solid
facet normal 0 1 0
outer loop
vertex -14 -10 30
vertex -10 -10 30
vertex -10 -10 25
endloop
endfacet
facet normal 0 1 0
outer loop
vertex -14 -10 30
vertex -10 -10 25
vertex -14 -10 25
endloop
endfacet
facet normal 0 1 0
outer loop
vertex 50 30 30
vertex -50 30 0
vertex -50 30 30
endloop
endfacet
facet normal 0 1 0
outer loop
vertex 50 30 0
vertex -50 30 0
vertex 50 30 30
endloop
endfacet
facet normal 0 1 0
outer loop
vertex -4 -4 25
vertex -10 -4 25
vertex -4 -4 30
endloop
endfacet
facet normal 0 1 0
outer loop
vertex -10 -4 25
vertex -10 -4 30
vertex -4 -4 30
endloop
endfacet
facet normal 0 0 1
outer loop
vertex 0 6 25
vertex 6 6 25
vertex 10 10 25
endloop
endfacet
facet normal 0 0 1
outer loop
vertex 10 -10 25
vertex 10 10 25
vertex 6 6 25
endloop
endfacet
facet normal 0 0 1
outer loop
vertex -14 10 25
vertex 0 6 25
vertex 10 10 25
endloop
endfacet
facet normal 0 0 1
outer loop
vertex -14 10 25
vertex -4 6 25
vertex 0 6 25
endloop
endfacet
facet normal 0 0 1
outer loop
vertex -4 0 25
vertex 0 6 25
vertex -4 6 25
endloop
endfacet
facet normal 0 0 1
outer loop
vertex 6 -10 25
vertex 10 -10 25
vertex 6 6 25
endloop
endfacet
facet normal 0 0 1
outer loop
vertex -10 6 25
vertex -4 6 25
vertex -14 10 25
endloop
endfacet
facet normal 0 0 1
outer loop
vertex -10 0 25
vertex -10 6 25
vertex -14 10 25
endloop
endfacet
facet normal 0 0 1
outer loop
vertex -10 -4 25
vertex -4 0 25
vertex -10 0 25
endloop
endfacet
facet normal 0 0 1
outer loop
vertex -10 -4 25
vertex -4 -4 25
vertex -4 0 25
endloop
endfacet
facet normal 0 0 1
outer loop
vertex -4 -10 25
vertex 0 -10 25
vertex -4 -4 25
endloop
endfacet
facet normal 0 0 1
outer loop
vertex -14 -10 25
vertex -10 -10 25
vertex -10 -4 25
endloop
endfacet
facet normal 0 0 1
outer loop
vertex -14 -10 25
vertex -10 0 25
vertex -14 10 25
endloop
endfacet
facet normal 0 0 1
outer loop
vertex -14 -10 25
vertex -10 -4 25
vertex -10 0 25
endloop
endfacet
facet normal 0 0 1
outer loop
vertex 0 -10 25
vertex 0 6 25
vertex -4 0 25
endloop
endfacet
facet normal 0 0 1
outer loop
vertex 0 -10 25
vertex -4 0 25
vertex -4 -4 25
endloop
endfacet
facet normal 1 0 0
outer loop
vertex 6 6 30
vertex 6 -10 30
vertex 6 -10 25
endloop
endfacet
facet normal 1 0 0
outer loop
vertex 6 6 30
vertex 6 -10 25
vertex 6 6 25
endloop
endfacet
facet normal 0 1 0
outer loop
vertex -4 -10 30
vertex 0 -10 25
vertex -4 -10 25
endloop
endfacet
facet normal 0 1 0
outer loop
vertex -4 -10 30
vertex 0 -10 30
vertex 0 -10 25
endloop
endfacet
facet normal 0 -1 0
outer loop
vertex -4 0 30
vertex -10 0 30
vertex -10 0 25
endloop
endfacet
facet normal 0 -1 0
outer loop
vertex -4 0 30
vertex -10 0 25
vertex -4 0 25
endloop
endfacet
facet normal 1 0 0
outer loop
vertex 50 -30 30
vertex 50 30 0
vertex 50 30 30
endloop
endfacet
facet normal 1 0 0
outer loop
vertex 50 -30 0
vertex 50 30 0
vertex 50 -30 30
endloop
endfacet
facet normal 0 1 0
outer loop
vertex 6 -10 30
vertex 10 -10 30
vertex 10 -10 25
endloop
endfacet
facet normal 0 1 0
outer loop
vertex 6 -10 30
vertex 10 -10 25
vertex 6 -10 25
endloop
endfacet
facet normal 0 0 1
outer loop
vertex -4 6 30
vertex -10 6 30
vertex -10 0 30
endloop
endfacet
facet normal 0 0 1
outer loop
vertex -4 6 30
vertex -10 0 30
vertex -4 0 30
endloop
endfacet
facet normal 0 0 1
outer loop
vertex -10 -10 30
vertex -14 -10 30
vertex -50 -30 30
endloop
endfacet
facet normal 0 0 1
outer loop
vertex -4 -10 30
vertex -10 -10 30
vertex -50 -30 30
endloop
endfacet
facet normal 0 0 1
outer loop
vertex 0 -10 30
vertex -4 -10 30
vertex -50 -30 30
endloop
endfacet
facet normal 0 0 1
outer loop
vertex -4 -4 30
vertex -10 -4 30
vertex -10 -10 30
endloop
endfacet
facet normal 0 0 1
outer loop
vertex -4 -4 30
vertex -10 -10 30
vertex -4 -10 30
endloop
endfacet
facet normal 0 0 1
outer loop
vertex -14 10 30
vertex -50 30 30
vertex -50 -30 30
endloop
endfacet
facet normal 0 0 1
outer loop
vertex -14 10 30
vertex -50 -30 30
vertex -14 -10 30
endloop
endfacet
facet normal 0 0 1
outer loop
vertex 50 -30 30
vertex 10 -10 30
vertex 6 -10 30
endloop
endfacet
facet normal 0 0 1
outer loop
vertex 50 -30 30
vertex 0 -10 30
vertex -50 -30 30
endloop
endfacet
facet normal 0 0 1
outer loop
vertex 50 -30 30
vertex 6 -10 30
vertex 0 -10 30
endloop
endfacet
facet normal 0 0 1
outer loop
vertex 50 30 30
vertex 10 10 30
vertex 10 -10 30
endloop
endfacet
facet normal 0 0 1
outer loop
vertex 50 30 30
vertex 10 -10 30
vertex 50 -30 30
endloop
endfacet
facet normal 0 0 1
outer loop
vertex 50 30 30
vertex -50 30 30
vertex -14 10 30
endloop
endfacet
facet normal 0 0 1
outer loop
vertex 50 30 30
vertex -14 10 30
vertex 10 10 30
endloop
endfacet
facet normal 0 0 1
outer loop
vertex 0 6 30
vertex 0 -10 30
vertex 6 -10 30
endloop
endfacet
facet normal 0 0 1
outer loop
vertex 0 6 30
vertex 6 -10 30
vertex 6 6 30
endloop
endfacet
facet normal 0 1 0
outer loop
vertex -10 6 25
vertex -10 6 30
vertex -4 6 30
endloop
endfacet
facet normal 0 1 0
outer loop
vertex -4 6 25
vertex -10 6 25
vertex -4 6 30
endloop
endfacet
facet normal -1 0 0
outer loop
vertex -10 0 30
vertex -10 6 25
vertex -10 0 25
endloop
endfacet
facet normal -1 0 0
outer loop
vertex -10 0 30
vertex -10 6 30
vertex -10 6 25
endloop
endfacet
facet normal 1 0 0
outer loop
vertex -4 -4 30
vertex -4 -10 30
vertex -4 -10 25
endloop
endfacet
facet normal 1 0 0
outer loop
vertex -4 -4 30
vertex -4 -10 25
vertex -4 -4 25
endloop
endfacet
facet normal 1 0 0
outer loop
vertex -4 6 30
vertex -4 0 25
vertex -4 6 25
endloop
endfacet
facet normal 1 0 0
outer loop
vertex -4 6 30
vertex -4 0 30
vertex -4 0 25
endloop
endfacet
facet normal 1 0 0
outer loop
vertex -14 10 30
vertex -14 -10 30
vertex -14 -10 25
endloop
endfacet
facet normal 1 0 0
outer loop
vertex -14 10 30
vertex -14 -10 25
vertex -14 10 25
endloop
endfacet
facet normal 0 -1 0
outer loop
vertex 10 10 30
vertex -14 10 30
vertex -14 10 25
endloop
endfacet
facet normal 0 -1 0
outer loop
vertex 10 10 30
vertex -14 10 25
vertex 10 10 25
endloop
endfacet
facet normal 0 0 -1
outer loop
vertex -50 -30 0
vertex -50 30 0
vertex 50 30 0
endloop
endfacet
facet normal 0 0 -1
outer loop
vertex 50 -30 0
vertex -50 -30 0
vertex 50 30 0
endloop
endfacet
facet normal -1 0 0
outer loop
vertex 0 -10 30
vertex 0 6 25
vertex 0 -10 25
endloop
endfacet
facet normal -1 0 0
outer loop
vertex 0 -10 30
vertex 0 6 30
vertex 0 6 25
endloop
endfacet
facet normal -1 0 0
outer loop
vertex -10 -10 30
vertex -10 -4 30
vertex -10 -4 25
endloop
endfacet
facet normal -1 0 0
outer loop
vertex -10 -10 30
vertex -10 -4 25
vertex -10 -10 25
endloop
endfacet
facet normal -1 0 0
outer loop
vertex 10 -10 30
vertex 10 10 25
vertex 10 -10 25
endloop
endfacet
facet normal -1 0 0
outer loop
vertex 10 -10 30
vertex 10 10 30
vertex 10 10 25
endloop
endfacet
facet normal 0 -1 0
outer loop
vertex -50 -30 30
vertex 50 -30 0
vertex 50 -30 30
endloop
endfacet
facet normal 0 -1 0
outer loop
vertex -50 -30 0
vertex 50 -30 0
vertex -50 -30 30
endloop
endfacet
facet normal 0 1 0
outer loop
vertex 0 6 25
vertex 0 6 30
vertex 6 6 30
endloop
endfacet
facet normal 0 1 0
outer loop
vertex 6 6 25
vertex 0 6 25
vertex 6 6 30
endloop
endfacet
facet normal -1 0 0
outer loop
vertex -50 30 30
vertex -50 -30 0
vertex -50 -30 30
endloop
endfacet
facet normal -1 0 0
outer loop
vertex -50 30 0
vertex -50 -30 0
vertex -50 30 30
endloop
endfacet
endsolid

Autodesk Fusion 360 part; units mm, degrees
sketch "Skizze1" plane through (0, 0, 0) normal (0, 0, 1) x (1, 0, 0)
  line L0 (50, -30) -> (-50, -30)
  line L1 (-50, -30) -> (-50, 30)
  line L2 (-50, 30) -> (50, 30)
  line L3 (50, 30) -> (50, -30)
  line L4 (50, -30) -> (-50, 30) construction
  line L5 (-50, -30) -> (50, 30) construction
  dimension "d1" = 100
  dimension "d2" = 60
extrude "Extrusion1" add sketch "Skizze1" along normal blind 30
sketch "Skizze2" plane through (0, 0, 30) normal (0, 0, 1) x (-1, 0, 0)
  line L0 (-50, -30) -> (50, -30)
  line L1 (50, -30) -> (50, 30)
  line L2 (50, 30) -> (-50, 30)
  line L3 (-50, 30) -> (-50, -30)
  line L4 (10, 10) -> (14, 10)
  line L5 (14, 10) -> (14, -10)
  line L6 (14, -10) -> (10, -10)
  line L7 (0, -6) -> (0, 10)
  line L8 (4, -10) -> (0, -10)
  line L9 (0, 10) -> (4, 10)
  line L10 (-6, 10) -> (-6, -6)
  line L11 (-10, -10) -> (-10, 10)
  line L12 (-6, -10) -> (-10, -10)
  line L13 (-10, 10) -> (-6, 10)
  line L14 (14, -10) -> (-10, -10)
  line L15 (14, -10) -> (14, -6)
  line L16 (10, 0) -> (4, 0)
  line L17 (14, 0) -> (14, 4)
  line L18 (10, 4) -> (4, 4)
  line L19 (10, -6) -> (10, 0)
  line L20 (10, 4) -> (10, 10)
  line L21 (4, 10) -> (4, 4)
  line L22 (4, 0) -> (4, -6)
  line L23 (10, -6) -> (4, -6)
  line L24 (0, -6) -> (-6, -6)
  dimension "d5" = 4
  dimension "d10" = 4
  dimension "d11" = 4
extrude "Extrusion2" cut sketch "Skizze2" against normal blind 5 contours L4 L5 L6 L7 L8 L9 L10 L11 L12 L13 L14 L15 L17 L18 L20 L21 L24
